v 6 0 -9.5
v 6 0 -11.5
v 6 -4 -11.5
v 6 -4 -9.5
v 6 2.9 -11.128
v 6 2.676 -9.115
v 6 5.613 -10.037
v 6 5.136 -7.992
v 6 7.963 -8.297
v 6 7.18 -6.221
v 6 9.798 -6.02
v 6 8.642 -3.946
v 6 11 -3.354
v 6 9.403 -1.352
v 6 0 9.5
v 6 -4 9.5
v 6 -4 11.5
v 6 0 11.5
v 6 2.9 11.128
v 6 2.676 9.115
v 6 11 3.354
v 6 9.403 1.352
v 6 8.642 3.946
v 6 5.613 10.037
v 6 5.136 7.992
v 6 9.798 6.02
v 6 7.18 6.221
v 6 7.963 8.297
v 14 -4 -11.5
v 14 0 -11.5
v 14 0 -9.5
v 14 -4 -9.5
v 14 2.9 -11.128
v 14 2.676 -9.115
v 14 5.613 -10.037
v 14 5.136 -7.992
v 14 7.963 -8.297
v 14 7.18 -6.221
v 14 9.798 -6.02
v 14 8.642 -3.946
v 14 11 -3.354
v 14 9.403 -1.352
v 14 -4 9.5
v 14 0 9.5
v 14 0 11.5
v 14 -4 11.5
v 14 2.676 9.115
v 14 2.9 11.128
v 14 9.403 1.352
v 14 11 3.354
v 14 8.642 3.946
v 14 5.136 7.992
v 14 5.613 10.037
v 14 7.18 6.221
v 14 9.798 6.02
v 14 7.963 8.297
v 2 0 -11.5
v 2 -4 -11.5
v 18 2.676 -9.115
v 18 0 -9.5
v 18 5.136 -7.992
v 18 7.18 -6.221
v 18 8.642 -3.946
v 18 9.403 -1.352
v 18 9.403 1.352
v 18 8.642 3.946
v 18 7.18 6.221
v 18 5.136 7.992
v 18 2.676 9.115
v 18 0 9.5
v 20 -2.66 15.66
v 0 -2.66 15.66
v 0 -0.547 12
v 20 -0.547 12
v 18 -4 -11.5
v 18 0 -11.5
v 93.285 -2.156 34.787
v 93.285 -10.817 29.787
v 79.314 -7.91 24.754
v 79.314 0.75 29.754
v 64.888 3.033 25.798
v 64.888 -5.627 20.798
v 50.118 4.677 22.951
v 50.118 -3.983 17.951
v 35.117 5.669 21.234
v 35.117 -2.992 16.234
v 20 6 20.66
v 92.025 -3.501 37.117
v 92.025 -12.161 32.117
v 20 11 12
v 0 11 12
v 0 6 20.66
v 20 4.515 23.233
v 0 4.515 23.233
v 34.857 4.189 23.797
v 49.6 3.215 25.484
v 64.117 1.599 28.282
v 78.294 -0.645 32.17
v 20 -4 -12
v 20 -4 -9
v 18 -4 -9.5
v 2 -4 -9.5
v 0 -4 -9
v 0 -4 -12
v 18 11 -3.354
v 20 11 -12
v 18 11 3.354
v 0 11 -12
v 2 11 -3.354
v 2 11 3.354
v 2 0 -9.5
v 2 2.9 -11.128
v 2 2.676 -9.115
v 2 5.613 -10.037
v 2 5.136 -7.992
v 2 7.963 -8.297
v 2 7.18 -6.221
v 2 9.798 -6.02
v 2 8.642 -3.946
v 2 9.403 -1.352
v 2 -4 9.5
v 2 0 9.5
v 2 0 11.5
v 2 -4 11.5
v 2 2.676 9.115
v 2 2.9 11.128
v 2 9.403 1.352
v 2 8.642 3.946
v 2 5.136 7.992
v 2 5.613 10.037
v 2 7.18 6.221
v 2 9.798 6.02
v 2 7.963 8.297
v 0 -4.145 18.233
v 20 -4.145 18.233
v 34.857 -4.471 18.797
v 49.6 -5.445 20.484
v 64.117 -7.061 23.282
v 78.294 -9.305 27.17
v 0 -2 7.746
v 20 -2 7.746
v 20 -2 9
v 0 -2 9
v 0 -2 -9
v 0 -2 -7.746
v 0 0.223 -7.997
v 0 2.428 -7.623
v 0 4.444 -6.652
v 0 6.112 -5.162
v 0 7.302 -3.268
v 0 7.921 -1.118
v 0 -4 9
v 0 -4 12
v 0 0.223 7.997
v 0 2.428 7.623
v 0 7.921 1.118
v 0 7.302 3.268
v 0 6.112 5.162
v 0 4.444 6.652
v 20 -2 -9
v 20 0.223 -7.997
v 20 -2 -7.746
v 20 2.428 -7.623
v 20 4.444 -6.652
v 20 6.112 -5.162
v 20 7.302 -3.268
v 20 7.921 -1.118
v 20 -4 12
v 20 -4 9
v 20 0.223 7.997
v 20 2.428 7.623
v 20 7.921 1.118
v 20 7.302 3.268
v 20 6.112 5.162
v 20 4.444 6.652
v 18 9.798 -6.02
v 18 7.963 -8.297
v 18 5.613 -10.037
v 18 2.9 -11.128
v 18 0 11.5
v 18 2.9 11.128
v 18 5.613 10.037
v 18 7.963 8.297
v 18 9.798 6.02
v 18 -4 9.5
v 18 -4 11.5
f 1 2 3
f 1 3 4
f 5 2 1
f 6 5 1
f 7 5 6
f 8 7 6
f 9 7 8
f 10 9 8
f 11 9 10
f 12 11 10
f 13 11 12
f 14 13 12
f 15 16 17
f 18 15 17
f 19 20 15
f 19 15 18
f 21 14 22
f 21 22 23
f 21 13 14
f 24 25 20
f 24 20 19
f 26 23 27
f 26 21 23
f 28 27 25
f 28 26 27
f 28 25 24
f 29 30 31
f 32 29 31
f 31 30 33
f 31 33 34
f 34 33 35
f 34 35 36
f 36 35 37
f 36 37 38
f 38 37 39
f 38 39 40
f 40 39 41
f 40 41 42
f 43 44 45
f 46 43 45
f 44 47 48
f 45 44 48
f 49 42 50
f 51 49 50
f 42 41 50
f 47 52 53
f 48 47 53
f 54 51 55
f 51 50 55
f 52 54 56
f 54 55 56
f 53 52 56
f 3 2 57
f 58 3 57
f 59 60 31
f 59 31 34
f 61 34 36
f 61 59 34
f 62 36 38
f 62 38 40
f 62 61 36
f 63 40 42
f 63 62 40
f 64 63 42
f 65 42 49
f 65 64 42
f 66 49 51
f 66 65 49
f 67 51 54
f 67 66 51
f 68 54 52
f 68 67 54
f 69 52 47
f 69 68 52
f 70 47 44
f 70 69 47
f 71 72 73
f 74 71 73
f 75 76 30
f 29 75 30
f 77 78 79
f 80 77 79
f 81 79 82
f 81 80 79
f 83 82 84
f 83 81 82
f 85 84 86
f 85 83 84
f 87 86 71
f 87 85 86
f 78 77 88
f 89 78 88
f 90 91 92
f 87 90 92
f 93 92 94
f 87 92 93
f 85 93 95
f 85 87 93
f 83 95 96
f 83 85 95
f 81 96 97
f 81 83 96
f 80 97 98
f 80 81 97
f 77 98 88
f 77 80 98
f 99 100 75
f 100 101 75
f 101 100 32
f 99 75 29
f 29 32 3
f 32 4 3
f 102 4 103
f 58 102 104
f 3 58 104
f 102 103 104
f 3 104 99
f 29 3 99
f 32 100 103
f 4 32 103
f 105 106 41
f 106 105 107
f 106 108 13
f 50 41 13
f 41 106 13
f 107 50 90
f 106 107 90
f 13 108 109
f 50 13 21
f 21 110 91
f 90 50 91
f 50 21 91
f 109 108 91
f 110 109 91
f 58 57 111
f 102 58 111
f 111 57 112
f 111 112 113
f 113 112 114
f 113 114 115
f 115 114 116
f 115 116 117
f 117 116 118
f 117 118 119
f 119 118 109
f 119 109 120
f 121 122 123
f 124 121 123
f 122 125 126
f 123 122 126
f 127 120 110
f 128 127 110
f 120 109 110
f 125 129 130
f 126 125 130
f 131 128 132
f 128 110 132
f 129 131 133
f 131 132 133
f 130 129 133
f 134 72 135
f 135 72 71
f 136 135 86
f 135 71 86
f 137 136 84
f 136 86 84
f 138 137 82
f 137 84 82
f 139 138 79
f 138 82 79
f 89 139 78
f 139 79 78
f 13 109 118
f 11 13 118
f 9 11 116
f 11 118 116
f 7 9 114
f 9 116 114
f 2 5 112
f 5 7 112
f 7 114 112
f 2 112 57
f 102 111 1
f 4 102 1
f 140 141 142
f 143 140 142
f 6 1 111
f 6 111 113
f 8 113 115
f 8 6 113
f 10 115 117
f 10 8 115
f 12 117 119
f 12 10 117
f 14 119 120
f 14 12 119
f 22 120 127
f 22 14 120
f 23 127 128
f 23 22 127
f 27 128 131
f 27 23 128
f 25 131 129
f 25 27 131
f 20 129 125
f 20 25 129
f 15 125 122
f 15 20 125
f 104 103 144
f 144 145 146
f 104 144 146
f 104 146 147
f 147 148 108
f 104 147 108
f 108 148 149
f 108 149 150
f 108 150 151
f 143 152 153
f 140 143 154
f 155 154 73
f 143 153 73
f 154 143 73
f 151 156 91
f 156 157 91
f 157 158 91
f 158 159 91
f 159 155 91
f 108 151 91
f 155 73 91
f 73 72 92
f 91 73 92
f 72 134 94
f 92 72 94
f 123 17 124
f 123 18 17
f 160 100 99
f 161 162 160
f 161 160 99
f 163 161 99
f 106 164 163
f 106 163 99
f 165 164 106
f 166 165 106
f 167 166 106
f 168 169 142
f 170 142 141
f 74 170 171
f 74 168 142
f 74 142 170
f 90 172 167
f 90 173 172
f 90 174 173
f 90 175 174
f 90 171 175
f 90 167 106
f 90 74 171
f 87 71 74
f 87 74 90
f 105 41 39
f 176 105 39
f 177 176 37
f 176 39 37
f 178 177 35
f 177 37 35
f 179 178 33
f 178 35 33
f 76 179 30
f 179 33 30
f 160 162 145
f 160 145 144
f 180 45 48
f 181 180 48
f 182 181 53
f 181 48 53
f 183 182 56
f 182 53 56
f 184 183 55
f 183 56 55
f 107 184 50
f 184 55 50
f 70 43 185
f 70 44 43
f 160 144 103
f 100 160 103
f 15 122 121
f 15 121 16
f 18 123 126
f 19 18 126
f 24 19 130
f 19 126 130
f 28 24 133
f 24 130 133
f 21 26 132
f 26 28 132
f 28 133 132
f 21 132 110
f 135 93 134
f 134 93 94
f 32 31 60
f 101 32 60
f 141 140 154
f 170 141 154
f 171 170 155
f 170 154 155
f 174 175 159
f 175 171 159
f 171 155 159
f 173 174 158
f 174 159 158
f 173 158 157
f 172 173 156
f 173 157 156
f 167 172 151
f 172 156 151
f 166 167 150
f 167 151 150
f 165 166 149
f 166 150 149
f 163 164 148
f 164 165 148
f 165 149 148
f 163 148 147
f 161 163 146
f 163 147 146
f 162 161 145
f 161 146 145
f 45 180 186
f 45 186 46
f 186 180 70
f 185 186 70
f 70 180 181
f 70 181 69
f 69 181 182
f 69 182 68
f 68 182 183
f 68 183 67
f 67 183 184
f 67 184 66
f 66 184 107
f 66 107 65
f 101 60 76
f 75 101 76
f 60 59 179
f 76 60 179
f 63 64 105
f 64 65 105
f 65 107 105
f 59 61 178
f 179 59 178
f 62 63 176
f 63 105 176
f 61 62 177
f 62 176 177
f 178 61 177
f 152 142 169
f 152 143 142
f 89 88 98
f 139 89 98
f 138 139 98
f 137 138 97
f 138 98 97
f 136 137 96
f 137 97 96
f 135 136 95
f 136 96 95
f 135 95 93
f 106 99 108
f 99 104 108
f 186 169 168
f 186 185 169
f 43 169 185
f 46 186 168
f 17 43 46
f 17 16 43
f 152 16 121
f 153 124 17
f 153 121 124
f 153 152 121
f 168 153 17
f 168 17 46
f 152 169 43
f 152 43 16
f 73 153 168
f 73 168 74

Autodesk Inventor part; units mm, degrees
ref_plane "YZ Plane" through (0, 0, 0) normal (1, 0, 0) x (0, 1, 0)
ref_plane "XZ Plane" through (0, 0, 0) normal (0, 1, 0) x (-1, 0, 0)
ref_plane "XY Plane" through (0, 0, 0) normal (0, 0, 1) x (1, 0, 0)
sketch "Sketch1" plane through (0, 0, 0) normal (1, 0, 0) x (0, 1, 0)
  arc A0 (-2, -7.746) -> (-2, 7.746) centre (0, 0) ccw
  line L0 (0, 0) -> (-2, 0)
  line L1 (-2, 7.746) -> (-2, 9)
  line L2 (-2, 9) -> (-4, 9)
  line L3 (-4, 9) -> (-4, 12)
  line L4 (-4, 12) -> (11, 12)
  line L5 (-2, 0) -> (-2, -9)
  line L6 (-2, -9) -> (-4, -9)
  line L7 (-4, -9) -> (-4, -12)
  line L8 (-4, -12) -> (11, -12)
  line L9 (11, -12) -> (11, 12)
  line L10 (11, 12) -> (6, 20.6603)
  line L11 (11, 12) -> (21, 12) construction
  line L12 (6, 20.6603) -> (-2.6603, 15.6603)
  line L13 (-2.6603, 15.6603) -> (-0.547, 12)
  dimension "d0" = 16
  dimension "d1" = 2
  dimension "d2" = 9
  dimension "d3" = 2
  dimension "d4" = 3
  dimension "d5" = 15
  dimension "d6" = 9
  dimension "d7" = 3
  dimension "d8" = 10
  dimension "d9" = 120
  dimension "d10" = 10
extrude "Extrusion1" add sketch "Sketch1" along normal blind 20
ref_plane "Work Plane1" through (20, 8, 0) normal (0, 0, -1) x (-1, 0, 0)
ref_plane "Work Plane2" through (0, 0, 12) normal (0, 1, 0) x (1, 0, 0)
sketch "Sketch3" plane through (0, 0, 12) normal (0, 1, 0) x (1, 0, 0)
  line L0 (0, 21) -> (20, 21) projected
  line L1 (10, 21) -> (10, 22.5)
  line L2 (10, 22.5) -> (14, 22.5)
  line L3 (14, 22.5) -> (14, 21.5)
  line L4 (14, 21.5) -> (18, 21.5)
  line L5 (18, 21.5) -> (18, 23.5)
  line L6 (18, 23.5) -> (14, 23.5)
  line L7 (14, 23.5) -> (14, 22.5)
  line L8 (10, 22.5) -> (6, 22.5)
  line L9 (6, 22.5) -> (6, 23.5)
  line L10 (6, 23.5) -> (2, 23.5)
  line L11 (2, 23.5) -> (2, 21.5)
  line L12 (2, 21.5) -> (6, 21.5)
  line L13 (6, 22.5) -> (6, 21.5)
  line L14 (0, 3) -> (20, 3) projected
  line L15 (20, 21) -> (20, 3)
  line L16 (20, 20) -> (20, 4) projected
  line L17 (20, 12) -> (6.2446, 12)
  line L18 (0, 3) -> (20, 3)
  line L19 (10, 3) -> (10, 1.5)
  line L20 (10, 1.5) -> (14, 1.5)
  line L21 (14, 1.5) -> (14, 2.5)
  line L22 (14, 2.5) -> (18, 2.5)
  line L23 (18, 2.5) -> (18, 0.5)
  line L24 (18, 0.5) -> (14, 0.5)
  line L25 (14, 0.5) -> (14, 1.5)
  line L26 (10, 1.5) -> (6, 1.5)
  line L27 (6, 1.5) -> (6, 0.5)
  line L28 (6, 0.5) -> (2, 0.5)
  line L29 (2, 0.5) -> (2, 2.5)
  line L30 (2, 2.5) -> (6, 2.5)
  line L31 (6, 1.5) -> (6, 2.5)
  point P0 (0, 12)
  point P1 (20, 4.254)
  point P2 (20, 19.746)
  dimension "d25" = 1.5
  dimension "d26" = 4
  dimension "d27" = 1
  dimension "d28" = 4
  dimension "d29" = 2
  dimension "d30" = 4
  dimension "d31" = 1
  dimension "d32" = 4
  dimension "d33" = 2
revolve "Revolution1" cut sketch "Sketch3" angle 180 about axis through (20, 0, 0) along (1, 0, 0) contours L13 L12 L11 L10 L9 | L7 L6 L5 L4 L3
extrude "Extrusion3" cut sketch "Sketch3" against normal blind 20
sketch "Sketch5" plane through (0, 6, 20.6603) normal (0, 0.866, 0.5) x (1, 0, 0)
  line L0 (0, 10) -> (0, 0) projected
  line L1 (0, 0) -> (20, 0) projected
  line L2 (0, 0) -> (20, 0)
  arc A0 (93.2847, -16.3126) -> (20, 0) centre (20, -172.7725) ccw
  arc A1 (92.0249, -19.0024) -> (20, -2.9702) centre (20, -172.7725) ccw
  line L3 (20, -2.9702) -> (0, -2.9702)
  line L4 (0, 0) -> (0, -2.9702)
  line L5 (93.2847, -16.3126) -> (92.0249, -19.0024)
  point P0 (0, 14.8923)
extrude "Extrusion4" add sketch "Sketch5" against normal up to surface (10 mm away)
equation "\"BendRadius\" = Thickness"
equation "\"BendReliefWidth\" = Thickness"
equation "\"BendReliefDepth\" = 0.5 * Thickness"
equation "\"CornerReliefSize\" = 4 * Thickness"
equation "\"MinimumRemnant\" = 2 * Thickness"
equation "\"TransitionRadius\" = BendRadius"
equation "\"JacobiRadiusSize\" = BendRadius"
equation "\"GapSize\" = Thickness"
equation "\"Thickness\" = 0.5"
properties part number "abrazadera_leds"
